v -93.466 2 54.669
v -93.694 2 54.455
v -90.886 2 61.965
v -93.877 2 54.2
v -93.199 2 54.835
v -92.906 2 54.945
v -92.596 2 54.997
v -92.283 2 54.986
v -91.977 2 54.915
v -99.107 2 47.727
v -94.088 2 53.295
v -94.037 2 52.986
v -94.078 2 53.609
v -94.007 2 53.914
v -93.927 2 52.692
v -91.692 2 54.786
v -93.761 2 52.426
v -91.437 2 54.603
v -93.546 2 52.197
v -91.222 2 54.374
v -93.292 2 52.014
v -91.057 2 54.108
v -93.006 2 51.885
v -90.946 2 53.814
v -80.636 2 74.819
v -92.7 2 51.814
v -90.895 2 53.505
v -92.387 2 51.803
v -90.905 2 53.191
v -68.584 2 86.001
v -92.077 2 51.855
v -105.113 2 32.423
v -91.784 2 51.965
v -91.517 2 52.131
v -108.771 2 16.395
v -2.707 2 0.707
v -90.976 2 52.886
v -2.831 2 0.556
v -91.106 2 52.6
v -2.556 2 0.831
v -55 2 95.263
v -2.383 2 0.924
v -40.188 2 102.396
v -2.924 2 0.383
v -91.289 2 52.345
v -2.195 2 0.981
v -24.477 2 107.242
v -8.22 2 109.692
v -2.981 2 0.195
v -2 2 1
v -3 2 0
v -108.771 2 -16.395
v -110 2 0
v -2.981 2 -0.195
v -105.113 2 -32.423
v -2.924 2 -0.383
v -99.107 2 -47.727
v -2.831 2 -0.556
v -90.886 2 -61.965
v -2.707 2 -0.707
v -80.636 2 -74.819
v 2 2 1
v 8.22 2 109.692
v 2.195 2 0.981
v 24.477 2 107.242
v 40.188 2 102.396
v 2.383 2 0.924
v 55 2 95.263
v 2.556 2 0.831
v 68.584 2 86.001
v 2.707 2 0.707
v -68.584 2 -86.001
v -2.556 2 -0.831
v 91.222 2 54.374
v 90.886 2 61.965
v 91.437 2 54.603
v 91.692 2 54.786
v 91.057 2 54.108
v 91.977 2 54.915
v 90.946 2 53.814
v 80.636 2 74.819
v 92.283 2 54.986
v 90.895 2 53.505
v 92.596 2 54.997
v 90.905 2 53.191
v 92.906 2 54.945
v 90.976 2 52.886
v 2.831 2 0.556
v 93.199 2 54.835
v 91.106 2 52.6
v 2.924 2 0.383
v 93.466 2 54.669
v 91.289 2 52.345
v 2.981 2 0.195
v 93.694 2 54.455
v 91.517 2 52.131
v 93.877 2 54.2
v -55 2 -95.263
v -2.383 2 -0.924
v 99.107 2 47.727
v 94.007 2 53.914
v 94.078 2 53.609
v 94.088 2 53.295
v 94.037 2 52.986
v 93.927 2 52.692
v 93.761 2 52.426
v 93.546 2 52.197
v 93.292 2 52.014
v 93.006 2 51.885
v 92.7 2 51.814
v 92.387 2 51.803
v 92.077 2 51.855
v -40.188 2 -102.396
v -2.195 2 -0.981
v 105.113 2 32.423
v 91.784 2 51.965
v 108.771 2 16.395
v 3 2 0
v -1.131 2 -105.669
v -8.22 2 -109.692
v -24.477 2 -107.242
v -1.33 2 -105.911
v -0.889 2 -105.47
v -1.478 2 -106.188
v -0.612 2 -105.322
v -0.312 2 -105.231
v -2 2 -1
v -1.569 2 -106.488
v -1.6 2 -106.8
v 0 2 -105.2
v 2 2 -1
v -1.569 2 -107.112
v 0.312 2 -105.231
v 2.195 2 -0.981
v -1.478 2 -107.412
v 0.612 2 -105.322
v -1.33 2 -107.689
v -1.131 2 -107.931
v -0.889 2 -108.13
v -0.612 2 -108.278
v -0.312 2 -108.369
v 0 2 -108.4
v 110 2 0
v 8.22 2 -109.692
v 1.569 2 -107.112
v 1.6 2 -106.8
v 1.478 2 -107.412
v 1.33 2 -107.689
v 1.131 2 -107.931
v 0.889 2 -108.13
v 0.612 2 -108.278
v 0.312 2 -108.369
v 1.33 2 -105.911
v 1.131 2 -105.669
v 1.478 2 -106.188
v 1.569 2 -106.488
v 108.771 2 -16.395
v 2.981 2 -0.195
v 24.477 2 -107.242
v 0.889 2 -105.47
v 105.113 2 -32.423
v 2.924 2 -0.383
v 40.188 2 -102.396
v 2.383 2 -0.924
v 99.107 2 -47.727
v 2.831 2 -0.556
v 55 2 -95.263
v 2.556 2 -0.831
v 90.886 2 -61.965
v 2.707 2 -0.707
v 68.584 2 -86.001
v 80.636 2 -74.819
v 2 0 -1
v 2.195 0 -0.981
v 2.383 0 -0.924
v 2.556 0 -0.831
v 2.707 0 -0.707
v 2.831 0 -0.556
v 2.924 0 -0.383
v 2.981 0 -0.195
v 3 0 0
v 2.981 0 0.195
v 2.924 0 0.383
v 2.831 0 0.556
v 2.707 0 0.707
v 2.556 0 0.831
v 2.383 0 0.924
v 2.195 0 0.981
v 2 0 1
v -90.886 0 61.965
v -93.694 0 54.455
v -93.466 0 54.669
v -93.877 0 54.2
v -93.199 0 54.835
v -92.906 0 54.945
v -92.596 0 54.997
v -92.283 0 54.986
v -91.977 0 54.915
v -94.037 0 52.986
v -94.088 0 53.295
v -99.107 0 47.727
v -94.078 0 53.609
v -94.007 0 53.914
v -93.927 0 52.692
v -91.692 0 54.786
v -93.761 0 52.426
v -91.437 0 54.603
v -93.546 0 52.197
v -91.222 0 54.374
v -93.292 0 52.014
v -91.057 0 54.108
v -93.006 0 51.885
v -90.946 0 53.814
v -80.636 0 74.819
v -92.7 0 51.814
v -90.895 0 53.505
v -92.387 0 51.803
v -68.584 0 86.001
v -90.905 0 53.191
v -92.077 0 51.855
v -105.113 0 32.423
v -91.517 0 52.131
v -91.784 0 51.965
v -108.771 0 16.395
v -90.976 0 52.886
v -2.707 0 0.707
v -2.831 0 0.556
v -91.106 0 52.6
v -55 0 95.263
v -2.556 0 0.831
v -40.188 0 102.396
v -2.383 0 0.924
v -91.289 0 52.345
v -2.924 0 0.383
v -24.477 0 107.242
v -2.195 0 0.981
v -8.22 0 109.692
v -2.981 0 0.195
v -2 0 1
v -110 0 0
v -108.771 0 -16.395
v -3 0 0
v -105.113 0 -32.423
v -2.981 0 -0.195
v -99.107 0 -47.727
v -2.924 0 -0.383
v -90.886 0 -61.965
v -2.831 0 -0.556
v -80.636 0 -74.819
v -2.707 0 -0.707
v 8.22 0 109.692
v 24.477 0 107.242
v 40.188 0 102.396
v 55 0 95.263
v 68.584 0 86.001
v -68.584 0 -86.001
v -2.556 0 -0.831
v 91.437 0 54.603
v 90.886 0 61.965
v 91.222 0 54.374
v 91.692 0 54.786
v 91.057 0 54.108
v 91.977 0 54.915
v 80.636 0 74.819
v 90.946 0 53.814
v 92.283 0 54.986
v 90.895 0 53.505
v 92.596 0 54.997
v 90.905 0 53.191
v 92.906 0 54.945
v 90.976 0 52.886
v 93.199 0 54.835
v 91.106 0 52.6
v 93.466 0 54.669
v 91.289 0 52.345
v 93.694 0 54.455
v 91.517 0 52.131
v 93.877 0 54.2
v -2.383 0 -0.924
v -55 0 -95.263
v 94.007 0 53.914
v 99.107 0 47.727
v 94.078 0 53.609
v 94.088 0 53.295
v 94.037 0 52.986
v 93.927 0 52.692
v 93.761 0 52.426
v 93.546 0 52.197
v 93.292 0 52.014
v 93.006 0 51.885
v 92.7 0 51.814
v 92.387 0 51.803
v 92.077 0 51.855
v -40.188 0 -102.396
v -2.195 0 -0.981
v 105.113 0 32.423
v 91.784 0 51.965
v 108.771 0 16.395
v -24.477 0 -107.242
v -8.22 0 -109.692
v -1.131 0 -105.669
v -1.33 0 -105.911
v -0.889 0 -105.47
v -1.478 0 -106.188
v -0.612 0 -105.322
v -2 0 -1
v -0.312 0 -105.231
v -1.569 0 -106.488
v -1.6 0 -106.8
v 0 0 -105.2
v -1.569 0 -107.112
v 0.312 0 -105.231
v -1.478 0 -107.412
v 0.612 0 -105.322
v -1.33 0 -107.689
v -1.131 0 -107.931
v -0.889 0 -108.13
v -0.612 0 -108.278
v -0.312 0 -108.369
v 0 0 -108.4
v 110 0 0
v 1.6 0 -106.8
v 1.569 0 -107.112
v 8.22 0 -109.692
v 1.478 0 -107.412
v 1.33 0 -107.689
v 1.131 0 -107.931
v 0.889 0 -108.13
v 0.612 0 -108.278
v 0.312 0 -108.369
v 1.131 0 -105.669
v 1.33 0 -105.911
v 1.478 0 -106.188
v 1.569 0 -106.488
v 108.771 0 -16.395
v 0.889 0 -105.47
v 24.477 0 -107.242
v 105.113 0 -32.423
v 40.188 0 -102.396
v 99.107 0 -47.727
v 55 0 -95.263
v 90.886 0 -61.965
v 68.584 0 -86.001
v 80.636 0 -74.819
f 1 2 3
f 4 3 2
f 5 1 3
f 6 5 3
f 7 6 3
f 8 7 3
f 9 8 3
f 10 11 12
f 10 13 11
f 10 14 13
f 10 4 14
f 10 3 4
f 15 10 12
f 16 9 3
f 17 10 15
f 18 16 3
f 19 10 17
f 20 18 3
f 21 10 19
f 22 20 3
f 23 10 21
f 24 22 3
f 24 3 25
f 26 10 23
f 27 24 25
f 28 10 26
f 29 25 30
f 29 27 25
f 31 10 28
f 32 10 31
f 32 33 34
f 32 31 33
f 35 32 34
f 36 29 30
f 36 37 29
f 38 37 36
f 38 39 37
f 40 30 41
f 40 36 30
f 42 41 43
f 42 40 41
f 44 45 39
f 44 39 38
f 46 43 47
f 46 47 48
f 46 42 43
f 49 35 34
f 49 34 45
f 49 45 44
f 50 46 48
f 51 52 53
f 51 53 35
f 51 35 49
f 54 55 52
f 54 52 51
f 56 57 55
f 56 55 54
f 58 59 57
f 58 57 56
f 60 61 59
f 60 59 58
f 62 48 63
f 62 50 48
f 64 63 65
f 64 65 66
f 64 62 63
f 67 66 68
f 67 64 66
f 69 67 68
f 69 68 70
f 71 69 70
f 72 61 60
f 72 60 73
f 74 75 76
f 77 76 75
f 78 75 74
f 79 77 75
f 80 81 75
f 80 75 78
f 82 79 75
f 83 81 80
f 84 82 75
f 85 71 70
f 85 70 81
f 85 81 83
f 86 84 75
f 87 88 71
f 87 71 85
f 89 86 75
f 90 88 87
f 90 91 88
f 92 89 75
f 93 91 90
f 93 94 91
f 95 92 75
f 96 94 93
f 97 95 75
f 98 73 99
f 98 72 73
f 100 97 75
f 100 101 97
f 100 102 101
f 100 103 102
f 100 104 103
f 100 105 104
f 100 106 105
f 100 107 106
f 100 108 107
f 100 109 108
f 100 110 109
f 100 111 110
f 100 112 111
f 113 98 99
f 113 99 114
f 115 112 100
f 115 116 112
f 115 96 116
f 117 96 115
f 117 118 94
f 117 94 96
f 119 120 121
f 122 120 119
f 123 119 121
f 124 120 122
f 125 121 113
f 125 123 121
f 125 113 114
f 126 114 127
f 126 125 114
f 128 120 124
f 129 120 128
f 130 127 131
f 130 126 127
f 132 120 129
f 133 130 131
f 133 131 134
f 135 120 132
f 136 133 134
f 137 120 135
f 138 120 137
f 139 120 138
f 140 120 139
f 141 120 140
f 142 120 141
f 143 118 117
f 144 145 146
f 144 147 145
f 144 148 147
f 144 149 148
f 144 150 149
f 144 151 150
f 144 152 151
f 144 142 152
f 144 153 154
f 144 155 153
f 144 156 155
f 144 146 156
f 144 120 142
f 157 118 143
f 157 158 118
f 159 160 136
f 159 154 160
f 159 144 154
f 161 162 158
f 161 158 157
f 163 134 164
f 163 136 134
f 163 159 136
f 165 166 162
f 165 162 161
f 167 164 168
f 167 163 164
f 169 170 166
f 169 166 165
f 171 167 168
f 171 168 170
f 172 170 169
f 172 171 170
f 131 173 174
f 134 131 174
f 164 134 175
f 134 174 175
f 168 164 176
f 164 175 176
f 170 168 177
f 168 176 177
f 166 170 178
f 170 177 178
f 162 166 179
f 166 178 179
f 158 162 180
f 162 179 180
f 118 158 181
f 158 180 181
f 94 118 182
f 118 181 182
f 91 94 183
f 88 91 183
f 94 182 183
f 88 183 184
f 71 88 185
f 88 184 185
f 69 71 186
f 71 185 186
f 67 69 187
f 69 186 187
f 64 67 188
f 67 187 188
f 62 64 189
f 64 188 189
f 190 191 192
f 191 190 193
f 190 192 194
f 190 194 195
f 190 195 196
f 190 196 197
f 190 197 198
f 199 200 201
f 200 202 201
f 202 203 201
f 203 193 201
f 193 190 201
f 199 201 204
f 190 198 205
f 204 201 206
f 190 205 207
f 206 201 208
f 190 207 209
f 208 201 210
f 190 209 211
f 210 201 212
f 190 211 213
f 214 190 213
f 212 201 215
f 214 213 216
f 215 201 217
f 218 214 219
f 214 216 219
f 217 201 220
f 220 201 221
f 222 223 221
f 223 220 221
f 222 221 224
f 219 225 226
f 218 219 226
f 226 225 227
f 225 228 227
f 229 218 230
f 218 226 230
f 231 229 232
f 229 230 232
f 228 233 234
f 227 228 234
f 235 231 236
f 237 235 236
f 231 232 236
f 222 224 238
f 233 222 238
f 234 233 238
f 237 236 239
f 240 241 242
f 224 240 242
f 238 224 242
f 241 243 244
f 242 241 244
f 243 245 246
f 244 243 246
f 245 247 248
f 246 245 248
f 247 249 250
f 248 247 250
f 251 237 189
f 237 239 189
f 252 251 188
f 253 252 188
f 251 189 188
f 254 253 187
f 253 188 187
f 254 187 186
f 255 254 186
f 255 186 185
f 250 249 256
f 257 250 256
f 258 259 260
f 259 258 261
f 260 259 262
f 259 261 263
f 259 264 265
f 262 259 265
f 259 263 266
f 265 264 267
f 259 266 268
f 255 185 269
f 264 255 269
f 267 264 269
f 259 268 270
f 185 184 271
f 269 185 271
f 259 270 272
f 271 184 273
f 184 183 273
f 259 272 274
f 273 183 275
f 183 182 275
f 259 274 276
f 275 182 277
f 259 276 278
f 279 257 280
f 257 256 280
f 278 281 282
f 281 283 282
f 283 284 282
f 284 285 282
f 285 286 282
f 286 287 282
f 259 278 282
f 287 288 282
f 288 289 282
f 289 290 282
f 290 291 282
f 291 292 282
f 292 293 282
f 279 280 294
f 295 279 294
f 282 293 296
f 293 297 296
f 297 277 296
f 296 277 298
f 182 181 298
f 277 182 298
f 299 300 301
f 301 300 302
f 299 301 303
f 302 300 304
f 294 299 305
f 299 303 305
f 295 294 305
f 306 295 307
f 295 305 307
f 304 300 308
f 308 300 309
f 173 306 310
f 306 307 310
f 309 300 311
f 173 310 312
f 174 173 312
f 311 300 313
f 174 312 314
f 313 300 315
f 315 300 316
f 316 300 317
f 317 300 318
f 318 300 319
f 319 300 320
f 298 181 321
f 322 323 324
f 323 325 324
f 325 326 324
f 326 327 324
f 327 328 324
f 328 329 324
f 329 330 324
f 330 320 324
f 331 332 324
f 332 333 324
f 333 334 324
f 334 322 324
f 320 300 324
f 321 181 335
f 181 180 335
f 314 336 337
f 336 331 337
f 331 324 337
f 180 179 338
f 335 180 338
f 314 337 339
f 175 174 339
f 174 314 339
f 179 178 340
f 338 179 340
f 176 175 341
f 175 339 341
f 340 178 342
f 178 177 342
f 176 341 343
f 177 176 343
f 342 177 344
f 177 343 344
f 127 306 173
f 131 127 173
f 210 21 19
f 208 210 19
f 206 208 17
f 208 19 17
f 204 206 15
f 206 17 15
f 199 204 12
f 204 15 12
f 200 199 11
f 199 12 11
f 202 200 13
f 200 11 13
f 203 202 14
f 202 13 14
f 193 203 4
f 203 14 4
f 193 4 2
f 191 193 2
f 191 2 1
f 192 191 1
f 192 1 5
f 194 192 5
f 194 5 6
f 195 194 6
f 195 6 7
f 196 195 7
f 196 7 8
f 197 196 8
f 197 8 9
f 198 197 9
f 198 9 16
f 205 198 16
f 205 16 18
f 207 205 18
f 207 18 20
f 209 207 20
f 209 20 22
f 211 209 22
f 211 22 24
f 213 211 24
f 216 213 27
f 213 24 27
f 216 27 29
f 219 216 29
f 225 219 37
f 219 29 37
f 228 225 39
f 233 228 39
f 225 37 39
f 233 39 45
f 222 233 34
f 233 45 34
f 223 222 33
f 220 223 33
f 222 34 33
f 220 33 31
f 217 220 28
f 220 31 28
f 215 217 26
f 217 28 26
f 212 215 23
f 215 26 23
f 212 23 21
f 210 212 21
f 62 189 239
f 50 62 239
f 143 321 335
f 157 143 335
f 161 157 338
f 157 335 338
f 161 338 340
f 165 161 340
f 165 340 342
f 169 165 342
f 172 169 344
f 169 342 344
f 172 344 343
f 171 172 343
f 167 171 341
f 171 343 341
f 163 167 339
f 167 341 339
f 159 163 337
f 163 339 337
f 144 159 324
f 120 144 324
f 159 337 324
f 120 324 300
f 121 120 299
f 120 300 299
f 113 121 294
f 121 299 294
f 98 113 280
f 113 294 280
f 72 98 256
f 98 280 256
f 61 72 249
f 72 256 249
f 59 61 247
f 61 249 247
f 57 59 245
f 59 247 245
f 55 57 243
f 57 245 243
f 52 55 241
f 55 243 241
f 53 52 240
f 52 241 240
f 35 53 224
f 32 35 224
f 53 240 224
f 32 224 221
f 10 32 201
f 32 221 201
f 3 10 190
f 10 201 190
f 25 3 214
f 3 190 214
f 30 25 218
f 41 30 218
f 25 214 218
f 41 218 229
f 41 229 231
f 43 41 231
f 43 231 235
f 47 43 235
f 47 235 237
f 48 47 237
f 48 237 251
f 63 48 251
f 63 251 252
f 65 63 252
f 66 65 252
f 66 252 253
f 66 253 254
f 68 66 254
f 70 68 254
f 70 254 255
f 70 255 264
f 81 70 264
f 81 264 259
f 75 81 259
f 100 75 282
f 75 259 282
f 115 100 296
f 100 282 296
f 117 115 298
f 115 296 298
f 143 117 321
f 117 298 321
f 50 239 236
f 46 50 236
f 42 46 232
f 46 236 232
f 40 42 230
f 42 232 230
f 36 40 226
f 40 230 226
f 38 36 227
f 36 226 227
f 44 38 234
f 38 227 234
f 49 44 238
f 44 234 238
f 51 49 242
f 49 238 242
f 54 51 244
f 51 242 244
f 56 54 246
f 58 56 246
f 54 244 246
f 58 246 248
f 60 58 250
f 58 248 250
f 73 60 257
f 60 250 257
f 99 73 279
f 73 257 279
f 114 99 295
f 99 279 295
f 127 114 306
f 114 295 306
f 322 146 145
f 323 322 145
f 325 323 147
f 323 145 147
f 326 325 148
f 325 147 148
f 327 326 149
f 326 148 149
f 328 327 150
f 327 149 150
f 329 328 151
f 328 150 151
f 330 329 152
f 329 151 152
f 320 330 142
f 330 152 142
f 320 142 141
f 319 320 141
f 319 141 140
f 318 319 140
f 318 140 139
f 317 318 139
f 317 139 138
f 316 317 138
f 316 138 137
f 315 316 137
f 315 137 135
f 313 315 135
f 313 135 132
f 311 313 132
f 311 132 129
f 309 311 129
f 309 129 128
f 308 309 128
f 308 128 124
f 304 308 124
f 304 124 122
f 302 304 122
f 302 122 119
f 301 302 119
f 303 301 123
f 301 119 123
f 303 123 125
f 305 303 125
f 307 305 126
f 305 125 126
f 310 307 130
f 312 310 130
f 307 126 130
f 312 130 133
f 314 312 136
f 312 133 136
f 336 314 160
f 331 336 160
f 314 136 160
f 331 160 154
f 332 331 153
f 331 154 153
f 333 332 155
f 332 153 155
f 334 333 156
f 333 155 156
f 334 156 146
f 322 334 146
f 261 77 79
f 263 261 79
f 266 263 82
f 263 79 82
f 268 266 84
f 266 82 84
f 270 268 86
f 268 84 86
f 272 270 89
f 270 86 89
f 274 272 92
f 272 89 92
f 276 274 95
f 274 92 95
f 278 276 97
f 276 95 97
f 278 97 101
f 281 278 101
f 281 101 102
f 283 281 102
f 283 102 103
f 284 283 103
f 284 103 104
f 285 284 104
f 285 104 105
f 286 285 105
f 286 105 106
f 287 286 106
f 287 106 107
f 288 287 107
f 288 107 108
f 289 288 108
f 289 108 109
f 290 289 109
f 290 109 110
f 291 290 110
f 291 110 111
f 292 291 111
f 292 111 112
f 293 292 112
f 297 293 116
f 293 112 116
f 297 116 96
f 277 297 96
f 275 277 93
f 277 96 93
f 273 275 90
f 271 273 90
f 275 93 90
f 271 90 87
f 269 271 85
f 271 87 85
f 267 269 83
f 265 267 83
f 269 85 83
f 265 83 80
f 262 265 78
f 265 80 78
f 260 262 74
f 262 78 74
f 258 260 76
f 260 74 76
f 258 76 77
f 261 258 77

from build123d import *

# Parameters (mm, degrees)
ESQUISSE1_R                  = 110
BOSS_EXTRU_1_DEPTH           = 2
ESQUISSE2_R                  = 1.6
ENL_V_MAT_EXTRU_1_DEPTH      = 3
R_P_TITION_CIRCULAIRE2_COUNT = 3


with BuildPart() as part:
    # Esquisse1 → Boss.-Extru.1 (new body)
    with BuildSketch(Plane(origin=(0, 0, 0), x_dir=(1, 0, 0), z_dir=(0, 1, 0))):
        Circle(ESQUISSE1_R)
        with BuildLine():
            Line((-2, 1), (2, 1))
            ThreePointArc((2, 1), (3, 0), (2, -1))
            Line((2, -1), (-2, -1))
            ThreePointArc((-2, -1), (-3, 0), (-2, 1))
        make_face(mode=Mode.SUBTRACT)
    extrude(amount=BOSS_EXTRU_1_DEPTH)

    # Esquisse2 → Enlèv. mat.-Extru.1 (cut, through all)
    with BuildSketch(Plane(origin=(0, 2, 0), x_dir=(1, 0, 0), z_dir=(0, 1, 0))):
        with Locations((0, 106.8)):
            Circle(ESQUISSE2_R)
    enl_v_mat_extru_1 = extrude(amount=-ENL_V_MAT_EXTRU_1_DEPTH, mode=Mode.SUBTRACT)

    # Répétition circulaire2: Enlèv. mat.-Extru.1 ×3 about axis
    r_p_tition_circulaire2_axis = Axis((0, 0, 0), (0, 1, 0))
    for i in range(1, R_P_TITION_CIRCULAIRE2_COUNT):
        add(enl_v_mat_extru_1.rotate(r_p_tition_circulaire2_axis, i * 360 / R_P_TITION_CIRCULAIRE2_COUNT), mode=Mode.SUBTRACT)


solid = part.part
